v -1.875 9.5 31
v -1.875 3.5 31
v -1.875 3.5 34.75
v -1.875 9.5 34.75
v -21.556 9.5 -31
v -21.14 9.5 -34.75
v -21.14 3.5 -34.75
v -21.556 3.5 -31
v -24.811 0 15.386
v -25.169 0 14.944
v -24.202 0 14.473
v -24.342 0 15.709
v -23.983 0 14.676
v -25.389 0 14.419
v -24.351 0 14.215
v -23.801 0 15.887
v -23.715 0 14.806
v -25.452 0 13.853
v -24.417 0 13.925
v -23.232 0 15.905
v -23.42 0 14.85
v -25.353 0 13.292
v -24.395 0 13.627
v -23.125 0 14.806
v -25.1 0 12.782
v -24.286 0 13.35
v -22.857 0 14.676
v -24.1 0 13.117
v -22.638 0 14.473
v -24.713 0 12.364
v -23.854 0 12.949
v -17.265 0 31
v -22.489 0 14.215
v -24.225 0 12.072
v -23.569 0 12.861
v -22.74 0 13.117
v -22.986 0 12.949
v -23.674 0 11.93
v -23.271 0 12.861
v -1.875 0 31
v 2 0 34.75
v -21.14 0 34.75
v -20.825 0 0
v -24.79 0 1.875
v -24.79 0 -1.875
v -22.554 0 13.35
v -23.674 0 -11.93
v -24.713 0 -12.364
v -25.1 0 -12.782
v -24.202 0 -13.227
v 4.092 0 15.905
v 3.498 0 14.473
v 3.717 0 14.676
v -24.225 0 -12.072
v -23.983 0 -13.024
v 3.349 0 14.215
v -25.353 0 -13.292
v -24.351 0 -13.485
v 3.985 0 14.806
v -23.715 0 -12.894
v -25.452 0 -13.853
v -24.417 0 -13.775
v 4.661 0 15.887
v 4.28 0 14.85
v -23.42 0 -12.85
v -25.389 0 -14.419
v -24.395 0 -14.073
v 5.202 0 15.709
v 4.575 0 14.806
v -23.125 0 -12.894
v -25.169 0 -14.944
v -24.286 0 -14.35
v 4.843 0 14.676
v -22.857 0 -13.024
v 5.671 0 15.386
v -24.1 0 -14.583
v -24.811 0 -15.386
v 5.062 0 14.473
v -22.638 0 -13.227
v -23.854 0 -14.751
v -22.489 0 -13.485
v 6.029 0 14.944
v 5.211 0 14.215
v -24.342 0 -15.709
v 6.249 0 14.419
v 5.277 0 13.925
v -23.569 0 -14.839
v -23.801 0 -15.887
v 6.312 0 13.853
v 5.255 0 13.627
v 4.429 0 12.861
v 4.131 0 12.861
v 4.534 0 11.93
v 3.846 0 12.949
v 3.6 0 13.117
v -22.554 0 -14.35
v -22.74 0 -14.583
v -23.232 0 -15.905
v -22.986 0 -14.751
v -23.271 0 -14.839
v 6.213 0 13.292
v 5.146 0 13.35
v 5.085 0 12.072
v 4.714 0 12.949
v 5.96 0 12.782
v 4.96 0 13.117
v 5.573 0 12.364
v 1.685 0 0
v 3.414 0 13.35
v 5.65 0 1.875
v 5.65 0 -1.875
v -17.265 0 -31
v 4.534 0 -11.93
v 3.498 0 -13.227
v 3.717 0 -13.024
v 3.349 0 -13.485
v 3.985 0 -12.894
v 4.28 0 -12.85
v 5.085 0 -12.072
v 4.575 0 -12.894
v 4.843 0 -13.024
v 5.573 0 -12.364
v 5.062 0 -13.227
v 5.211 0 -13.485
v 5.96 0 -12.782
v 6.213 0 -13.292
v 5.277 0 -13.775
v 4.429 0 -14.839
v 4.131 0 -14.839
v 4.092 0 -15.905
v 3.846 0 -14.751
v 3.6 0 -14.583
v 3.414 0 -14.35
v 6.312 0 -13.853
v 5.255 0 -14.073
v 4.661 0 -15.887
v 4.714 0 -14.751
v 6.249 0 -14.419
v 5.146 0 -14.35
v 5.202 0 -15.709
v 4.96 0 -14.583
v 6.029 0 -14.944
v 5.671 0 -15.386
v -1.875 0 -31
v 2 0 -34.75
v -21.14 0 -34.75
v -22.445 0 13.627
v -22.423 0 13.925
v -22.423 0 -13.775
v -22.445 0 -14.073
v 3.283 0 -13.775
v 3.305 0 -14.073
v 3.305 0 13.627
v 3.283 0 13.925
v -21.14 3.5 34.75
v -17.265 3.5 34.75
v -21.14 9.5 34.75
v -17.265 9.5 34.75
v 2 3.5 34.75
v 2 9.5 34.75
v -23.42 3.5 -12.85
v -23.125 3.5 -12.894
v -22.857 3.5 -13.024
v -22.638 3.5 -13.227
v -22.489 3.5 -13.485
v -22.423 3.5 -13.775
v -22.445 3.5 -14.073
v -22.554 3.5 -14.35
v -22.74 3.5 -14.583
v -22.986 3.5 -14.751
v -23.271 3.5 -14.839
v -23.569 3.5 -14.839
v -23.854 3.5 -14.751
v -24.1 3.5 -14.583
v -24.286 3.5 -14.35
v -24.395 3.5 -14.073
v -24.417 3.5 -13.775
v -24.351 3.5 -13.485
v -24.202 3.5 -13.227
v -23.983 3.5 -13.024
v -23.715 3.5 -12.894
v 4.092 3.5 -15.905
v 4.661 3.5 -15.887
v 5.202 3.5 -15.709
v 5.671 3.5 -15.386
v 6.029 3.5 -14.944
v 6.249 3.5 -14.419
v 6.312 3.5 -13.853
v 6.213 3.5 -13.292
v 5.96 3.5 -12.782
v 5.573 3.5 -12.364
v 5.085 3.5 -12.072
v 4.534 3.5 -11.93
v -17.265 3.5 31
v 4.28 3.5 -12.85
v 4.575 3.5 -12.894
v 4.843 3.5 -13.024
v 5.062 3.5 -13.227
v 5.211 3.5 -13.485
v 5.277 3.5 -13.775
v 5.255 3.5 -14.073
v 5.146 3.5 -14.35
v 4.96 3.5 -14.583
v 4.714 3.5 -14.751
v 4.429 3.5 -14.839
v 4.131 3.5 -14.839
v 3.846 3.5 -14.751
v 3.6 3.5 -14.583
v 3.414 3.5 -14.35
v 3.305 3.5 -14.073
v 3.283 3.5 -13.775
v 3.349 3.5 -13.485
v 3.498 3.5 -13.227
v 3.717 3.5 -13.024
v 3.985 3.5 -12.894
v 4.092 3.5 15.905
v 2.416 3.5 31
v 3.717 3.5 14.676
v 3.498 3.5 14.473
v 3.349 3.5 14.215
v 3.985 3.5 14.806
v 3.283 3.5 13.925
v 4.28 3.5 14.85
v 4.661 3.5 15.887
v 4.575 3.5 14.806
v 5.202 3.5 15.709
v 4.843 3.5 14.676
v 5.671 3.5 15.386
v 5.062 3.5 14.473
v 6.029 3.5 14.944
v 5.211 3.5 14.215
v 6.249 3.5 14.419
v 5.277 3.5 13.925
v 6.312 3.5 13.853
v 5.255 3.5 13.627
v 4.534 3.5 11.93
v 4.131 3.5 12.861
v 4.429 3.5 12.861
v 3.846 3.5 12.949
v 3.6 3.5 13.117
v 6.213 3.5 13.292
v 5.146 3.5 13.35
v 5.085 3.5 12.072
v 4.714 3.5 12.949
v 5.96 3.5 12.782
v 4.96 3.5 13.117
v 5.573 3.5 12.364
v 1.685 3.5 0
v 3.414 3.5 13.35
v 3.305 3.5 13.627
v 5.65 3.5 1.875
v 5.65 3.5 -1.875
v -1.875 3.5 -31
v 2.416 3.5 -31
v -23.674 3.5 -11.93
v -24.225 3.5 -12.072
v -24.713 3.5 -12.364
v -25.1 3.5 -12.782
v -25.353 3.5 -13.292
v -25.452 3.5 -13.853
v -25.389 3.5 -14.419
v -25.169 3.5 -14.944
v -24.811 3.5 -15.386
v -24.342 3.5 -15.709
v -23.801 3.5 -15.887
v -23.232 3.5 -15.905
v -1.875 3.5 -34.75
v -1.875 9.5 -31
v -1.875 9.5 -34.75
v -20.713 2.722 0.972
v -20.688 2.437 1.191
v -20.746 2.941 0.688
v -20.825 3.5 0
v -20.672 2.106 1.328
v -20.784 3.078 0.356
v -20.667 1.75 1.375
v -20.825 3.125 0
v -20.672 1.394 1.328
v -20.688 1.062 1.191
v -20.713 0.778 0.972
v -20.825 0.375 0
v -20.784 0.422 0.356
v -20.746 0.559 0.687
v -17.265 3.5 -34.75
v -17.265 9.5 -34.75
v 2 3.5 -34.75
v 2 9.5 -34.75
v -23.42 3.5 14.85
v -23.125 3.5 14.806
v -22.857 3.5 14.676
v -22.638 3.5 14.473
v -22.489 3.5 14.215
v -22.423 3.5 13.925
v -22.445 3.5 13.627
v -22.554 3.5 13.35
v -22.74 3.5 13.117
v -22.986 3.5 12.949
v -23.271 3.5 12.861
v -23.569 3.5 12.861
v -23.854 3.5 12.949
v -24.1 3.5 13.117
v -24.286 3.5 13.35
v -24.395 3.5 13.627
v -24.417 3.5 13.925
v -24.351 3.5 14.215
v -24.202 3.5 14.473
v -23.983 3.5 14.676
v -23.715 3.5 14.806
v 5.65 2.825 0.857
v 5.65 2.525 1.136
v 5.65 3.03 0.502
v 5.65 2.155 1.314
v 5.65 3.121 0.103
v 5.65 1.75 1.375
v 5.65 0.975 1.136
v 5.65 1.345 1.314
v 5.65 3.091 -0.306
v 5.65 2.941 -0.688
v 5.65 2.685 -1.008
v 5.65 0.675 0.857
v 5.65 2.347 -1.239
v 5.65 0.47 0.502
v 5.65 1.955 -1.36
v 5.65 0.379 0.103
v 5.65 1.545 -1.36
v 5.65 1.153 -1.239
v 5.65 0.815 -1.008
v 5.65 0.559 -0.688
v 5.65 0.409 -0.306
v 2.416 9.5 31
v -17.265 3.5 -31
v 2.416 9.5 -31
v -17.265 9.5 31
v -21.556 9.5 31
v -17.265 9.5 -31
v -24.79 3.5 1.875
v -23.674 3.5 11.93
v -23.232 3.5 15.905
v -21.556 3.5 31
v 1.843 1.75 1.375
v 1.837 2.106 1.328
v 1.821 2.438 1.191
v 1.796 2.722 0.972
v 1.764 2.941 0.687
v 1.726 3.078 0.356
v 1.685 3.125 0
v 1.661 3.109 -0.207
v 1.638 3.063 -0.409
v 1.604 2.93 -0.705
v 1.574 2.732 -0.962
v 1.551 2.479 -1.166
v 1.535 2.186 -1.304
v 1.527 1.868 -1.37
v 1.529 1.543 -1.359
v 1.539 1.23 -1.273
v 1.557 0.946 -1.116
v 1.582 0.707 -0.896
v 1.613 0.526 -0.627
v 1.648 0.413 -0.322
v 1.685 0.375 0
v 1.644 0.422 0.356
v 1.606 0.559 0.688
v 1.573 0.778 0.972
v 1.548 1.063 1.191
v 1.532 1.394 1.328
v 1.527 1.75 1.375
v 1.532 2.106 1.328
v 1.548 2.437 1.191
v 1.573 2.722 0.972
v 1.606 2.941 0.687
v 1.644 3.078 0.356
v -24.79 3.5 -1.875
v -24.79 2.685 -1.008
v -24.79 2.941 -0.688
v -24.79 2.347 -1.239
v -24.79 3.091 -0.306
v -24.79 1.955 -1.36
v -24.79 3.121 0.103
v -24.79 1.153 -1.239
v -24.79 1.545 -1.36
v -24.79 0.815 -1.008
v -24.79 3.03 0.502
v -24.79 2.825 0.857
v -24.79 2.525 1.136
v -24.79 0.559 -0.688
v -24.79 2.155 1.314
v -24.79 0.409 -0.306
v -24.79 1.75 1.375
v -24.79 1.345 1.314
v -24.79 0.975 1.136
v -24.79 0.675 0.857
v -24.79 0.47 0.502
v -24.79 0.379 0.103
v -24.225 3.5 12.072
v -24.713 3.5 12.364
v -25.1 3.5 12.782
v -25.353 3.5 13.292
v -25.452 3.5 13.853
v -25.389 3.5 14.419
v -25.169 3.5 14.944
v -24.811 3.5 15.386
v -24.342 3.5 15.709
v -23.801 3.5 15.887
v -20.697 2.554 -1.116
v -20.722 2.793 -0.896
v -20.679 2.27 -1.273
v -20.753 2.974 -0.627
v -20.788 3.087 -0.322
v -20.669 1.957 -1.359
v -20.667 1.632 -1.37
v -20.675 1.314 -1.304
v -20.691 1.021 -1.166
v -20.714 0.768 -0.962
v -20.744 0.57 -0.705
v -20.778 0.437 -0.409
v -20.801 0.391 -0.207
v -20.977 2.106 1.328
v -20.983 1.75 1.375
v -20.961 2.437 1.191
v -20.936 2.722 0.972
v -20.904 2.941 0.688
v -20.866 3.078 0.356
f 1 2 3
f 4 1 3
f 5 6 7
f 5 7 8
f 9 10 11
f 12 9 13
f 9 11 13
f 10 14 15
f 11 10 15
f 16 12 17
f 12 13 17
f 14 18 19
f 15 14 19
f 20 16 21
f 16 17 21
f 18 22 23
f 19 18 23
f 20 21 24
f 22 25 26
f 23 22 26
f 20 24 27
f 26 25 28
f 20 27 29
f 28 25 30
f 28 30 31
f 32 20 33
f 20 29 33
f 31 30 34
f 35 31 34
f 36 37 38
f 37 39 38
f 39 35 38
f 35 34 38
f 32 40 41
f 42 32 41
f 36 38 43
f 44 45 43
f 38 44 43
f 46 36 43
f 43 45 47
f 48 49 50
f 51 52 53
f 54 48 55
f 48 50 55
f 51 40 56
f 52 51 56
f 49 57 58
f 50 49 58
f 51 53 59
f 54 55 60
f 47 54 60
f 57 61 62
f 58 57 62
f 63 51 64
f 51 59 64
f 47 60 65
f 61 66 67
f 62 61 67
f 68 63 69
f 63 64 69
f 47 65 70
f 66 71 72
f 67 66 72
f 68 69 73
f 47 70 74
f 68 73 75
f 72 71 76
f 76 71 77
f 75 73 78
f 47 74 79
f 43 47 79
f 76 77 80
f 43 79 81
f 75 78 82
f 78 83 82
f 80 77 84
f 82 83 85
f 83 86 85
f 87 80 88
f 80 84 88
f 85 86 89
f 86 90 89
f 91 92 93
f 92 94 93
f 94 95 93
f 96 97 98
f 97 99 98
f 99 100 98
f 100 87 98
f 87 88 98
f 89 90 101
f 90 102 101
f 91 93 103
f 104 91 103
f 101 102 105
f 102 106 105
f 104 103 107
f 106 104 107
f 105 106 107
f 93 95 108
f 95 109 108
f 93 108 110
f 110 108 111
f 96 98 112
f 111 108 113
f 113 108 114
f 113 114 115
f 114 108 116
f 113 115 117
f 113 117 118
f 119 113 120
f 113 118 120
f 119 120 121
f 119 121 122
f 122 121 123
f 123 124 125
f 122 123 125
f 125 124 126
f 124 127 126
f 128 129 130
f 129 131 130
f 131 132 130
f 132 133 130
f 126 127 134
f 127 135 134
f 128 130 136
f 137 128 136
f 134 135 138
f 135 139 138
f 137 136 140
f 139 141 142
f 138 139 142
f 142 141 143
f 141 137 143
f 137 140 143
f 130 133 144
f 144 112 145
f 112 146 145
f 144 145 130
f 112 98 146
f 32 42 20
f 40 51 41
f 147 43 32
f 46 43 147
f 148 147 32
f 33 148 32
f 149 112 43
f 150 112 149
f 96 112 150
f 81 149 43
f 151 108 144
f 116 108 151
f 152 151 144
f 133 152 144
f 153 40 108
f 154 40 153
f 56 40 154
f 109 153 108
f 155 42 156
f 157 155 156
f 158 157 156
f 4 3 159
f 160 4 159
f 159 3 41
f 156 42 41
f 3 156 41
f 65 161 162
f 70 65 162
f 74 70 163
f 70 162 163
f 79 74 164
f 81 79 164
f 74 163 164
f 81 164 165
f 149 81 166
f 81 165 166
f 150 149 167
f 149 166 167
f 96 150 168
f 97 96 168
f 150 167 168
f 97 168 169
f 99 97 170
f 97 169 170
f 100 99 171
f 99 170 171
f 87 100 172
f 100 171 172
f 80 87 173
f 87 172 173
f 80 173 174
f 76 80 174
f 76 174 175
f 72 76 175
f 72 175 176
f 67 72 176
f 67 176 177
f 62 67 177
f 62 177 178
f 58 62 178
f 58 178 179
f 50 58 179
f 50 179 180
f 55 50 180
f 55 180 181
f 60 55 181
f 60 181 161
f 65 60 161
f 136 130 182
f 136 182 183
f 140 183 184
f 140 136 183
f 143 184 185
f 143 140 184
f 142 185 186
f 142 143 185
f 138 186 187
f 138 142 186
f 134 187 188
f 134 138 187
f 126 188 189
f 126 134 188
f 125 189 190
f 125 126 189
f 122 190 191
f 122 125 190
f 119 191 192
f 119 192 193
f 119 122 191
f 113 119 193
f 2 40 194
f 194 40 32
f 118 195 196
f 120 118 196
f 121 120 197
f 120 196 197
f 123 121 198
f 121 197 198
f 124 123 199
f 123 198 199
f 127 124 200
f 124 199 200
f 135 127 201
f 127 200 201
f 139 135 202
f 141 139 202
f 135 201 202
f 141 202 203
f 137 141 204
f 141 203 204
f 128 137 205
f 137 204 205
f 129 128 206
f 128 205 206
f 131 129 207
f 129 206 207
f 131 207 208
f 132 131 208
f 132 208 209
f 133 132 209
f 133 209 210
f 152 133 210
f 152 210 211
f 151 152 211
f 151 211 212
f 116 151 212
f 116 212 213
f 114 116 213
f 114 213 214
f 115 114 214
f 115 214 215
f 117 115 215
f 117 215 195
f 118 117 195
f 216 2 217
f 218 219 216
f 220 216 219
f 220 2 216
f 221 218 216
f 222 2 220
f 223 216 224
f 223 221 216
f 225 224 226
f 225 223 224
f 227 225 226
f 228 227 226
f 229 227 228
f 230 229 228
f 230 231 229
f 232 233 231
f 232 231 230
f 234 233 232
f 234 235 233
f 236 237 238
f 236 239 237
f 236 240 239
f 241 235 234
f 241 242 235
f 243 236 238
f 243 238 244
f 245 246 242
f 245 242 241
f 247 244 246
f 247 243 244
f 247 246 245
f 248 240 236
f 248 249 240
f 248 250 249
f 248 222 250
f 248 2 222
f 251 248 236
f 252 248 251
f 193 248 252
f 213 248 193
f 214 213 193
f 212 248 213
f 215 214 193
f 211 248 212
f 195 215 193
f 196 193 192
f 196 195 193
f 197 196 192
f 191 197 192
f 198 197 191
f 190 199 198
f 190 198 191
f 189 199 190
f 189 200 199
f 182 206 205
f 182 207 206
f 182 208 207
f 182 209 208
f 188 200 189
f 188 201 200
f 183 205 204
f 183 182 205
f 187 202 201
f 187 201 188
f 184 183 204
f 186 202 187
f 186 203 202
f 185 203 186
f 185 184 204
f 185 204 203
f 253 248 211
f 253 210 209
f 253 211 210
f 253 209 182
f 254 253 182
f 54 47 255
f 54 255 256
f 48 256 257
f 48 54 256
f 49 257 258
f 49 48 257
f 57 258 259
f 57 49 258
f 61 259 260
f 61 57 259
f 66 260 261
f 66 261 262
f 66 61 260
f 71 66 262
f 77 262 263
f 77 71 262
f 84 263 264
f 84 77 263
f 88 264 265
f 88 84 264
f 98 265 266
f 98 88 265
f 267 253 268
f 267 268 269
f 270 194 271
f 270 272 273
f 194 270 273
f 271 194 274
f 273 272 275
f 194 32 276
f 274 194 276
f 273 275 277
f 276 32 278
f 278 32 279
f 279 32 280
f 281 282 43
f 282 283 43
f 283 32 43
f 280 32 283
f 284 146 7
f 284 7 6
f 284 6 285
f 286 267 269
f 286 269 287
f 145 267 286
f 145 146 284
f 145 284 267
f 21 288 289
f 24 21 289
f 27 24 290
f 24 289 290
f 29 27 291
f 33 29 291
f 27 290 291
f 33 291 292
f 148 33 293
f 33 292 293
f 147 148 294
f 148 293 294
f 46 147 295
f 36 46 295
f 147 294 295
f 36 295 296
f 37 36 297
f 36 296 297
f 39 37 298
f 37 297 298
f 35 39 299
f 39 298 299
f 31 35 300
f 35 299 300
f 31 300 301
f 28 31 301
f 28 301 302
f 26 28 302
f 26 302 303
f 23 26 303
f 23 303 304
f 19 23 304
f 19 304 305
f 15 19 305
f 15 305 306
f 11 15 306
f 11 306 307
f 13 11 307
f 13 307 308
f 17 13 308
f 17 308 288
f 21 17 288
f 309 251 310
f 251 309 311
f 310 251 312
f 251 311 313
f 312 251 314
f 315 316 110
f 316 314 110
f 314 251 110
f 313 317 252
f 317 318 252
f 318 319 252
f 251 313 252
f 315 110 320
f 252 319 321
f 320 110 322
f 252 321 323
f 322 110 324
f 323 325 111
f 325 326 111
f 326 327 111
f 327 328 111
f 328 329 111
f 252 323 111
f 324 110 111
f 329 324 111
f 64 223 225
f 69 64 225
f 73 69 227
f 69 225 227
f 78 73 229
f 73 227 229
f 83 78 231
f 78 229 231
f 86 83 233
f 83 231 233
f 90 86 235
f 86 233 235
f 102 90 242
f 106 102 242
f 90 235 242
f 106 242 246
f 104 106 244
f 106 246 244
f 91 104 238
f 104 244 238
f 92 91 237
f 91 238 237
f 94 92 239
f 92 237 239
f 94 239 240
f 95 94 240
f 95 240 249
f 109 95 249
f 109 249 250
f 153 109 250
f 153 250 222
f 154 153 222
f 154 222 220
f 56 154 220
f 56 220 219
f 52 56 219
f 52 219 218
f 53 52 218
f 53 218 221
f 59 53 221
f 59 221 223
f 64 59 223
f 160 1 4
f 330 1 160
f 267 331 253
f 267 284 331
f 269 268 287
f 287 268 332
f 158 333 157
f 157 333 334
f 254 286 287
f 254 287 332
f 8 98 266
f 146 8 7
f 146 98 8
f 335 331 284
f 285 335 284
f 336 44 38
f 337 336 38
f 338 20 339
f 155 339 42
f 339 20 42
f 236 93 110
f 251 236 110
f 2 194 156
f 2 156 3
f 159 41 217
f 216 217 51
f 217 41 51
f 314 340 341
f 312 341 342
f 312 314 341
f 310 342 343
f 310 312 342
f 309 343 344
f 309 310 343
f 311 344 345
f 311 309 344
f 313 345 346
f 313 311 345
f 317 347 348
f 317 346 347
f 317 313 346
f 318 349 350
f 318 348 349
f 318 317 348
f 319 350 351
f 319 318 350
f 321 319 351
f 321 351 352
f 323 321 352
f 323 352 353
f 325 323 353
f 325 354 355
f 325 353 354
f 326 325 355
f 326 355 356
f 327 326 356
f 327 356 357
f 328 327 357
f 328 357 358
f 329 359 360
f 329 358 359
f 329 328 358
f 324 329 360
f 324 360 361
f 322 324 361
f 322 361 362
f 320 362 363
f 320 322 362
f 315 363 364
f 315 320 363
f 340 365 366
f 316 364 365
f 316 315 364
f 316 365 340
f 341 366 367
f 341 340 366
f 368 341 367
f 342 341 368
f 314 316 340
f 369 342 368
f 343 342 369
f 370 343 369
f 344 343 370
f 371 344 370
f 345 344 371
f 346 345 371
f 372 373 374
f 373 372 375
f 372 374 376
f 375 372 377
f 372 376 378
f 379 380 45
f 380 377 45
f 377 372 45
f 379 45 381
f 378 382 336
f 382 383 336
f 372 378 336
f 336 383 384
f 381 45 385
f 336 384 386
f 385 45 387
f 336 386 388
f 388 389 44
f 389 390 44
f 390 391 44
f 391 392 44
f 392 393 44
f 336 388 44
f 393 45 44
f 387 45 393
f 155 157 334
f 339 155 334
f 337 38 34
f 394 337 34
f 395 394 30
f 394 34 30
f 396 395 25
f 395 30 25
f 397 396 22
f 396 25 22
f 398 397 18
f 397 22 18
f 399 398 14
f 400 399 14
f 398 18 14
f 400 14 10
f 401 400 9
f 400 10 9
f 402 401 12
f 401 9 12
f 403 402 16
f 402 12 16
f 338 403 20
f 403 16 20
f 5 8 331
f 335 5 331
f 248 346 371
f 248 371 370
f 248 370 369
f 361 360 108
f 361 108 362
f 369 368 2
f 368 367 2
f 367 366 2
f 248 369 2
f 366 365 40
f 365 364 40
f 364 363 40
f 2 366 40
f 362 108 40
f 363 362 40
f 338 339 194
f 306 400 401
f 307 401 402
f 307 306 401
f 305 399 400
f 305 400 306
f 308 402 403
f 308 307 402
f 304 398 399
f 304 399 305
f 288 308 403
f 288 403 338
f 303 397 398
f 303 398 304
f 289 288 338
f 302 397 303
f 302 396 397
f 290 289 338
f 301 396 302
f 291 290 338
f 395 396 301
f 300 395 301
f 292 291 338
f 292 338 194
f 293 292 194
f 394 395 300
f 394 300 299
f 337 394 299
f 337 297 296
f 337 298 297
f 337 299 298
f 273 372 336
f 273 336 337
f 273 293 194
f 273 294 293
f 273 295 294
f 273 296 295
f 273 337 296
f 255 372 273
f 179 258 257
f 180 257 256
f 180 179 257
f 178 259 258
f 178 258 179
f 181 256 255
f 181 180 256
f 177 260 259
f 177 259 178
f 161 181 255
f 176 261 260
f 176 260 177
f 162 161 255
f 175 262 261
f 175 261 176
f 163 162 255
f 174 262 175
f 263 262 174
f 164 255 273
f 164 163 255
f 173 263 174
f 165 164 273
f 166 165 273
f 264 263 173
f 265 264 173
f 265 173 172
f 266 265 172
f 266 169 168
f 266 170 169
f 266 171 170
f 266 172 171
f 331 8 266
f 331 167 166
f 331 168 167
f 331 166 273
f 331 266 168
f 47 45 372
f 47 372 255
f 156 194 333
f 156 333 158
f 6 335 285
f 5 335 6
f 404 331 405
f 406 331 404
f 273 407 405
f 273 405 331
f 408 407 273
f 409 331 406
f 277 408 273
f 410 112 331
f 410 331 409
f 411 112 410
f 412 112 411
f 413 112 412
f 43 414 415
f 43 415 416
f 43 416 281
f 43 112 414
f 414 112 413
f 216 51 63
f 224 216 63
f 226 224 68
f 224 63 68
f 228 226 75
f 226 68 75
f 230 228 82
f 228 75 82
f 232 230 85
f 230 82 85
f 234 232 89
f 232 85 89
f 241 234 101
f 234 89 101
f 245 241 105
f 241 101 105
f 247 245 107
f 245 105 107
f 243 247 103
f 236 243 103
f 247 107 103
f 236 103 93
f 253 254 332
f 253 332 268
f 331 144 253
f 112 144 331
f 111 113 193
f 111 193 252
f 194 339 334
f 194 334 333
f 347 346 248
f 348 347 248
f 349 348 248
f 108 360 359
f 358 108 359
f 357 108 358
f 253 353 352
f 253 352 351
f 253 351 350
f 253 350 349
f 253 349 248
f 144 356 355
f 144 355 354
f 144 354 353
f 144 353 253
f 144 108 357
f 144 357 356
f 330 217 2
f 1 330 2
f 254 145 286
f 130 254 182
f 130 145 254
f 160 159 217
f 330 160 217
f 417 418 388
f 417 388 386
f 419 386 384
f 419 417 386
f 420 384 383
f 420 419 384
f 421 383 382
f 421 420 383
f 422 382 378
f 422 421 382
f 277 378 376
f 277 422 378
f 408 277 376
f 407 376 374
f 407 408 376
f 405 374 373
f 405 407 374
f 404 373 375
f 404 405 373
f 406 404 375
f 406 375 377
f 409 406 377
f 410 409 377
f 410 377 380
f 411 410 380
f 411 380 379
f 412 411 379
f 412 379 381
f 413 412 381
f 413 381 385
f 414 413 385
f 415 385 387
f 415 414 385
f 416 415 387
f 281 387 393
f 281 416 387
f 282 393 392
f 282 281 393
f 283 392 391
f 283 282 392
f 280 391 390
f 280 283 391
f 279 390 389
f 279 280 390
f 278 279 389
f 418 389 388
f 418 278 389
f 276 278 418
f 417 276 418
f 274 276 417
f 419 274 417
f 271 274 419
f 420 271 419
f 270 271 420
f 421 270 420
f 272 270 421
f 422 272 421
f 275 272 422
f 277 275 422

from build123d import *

# Parameters (mm, degrees)
BOSS_EXTRUDE1_DEPTH = 3.5
SKETCH2_R           = 1.375
CUT_EXTRUDE1_DEPTH  = 47.767592889
BOSS_EXTRUDE5_DEPTH = 6
SKETCH9_R           = 1
CUT_EXTRUDE2_DEPTH  = 10


with BuildPart() as part:
    # Sketch1 → Boss-Extrude1 (new body)
    with BuildSketch(Plane(origin=(0, 0, 0), x_dir=(1, 0, 0), z_dir=(0, 1, 0))):
        with BuildLine():
            Line((5.65, -1.875), (5.65, 1.875))
            Line((5.65, 1.875), (1.9, 1.875))
            Line((1.9, 1.875), (-1.875, -31))
            Line((-1.875, -31), (-17.265, -31))
            Line((-17.265, -31), (-21.04, 1.875))
            Line((-21.04, 1.875), (-24.79, 1.875))
            Line((-24.79, 1.875), (-24.79, -1.875))
            Line((-24.79, -1.875), (-23.673675208, -11.929569188))
            ThreePointArc((-23.673675208, -11.929569188), (-25.440763963, -14.138052226), (-23.232280925, -15.905140982))
            Line((-23.232280925, -15.905140982), (-21.14, -34.75))
            Line((-21.14, -34.75), (-19.14, -34.75))
            Line((-19.14, -34.75), (0, -34.75))
            Line((0, -34.75), (2, -34.75))
            Line((2, -34.75), (4.092280925, -15.905140982))
            ThreePointArc((4.092280925, -15.905140982), (6.300763963, -14.138052226), (4.533675208, -11.929569188))
            Line((4.533675208, -11.929569188), (5.65, -1.875))
        make_face()
    boss_extrude1 = extrude(amount=BOSS_EXTRUDE1_DEPTH)

    # Sketch2 → Cut-Extrude1 (cut, through all)
    with BuildSketch(Plane(origin=(5.65, 0, 0), x_dir=(0, 0, -1), z_dir=(1, 0, 0))):
        with Locations((0, 1.75)):
            Circle(SKETCH2_R)
    cut_extrude1 = extrude(amount=-CUT_EXTRUDE1_DEPTH, mode=Mode.SUBTRACT)

    # Sketch7 → Boss-Extrude5 (add)
    with BuildSketch(Plane(origin=(0, 3.5, 0), x_dir=(1, 0, 0), z_dir=(0, 1, 0))):
        Polygon((-1.875, -31), (-1.875, -34.75), (2, -34.75), (2.41634981, -31), align=None)
        Polygon((-21.55634981, -31), (-17.265, -31), (-17.265, -34.75), (-21.14, -34.75), align=None)
    boss_extrude5 = extrude(amount=BOSS_EXTRUDE5_DEPTH)

    # Mirror46: Boss-Extrude1, Cut-Extrude1, Boss-Extrude5 across plane
    add(boss_extrude1.mirror(Plane.XY))
    add(cut_extrude1.mirror(Plane.XY), mode=Mode.SUBTRACT)
    add(boss_extrude5.mirror(Plane.XY))

    # Sketch9 → Cut-Extrude2 (cut)
    with BuildSketch(Plane(origin=(0, 3.5, 0), x_dir=(1, 0, 0), z_dir=(0, 1, 0))):
        with Locations(Location((4.28, 13.85, 0), (0, 0, 270))):
            Circle(SKETCH9_R)
        with Locations(Location((-23.42, 13.85, 0), (0, 0, 270))):
            Circle(SKETCH9_R)
        with Locations(Location((-23.42, -13.85, 0), (0, 0, 270))):
            Circle(SKETCH9_R)
        with Locations(Location((4.28, -13.85, 0), (0, 0, 270))):
            Circle(SKETCH9_R)
    extrude(amount=-CUT_EXTRUDE2_DEPTH, mode=Mode.SUBTRACT)


solid = part.part
